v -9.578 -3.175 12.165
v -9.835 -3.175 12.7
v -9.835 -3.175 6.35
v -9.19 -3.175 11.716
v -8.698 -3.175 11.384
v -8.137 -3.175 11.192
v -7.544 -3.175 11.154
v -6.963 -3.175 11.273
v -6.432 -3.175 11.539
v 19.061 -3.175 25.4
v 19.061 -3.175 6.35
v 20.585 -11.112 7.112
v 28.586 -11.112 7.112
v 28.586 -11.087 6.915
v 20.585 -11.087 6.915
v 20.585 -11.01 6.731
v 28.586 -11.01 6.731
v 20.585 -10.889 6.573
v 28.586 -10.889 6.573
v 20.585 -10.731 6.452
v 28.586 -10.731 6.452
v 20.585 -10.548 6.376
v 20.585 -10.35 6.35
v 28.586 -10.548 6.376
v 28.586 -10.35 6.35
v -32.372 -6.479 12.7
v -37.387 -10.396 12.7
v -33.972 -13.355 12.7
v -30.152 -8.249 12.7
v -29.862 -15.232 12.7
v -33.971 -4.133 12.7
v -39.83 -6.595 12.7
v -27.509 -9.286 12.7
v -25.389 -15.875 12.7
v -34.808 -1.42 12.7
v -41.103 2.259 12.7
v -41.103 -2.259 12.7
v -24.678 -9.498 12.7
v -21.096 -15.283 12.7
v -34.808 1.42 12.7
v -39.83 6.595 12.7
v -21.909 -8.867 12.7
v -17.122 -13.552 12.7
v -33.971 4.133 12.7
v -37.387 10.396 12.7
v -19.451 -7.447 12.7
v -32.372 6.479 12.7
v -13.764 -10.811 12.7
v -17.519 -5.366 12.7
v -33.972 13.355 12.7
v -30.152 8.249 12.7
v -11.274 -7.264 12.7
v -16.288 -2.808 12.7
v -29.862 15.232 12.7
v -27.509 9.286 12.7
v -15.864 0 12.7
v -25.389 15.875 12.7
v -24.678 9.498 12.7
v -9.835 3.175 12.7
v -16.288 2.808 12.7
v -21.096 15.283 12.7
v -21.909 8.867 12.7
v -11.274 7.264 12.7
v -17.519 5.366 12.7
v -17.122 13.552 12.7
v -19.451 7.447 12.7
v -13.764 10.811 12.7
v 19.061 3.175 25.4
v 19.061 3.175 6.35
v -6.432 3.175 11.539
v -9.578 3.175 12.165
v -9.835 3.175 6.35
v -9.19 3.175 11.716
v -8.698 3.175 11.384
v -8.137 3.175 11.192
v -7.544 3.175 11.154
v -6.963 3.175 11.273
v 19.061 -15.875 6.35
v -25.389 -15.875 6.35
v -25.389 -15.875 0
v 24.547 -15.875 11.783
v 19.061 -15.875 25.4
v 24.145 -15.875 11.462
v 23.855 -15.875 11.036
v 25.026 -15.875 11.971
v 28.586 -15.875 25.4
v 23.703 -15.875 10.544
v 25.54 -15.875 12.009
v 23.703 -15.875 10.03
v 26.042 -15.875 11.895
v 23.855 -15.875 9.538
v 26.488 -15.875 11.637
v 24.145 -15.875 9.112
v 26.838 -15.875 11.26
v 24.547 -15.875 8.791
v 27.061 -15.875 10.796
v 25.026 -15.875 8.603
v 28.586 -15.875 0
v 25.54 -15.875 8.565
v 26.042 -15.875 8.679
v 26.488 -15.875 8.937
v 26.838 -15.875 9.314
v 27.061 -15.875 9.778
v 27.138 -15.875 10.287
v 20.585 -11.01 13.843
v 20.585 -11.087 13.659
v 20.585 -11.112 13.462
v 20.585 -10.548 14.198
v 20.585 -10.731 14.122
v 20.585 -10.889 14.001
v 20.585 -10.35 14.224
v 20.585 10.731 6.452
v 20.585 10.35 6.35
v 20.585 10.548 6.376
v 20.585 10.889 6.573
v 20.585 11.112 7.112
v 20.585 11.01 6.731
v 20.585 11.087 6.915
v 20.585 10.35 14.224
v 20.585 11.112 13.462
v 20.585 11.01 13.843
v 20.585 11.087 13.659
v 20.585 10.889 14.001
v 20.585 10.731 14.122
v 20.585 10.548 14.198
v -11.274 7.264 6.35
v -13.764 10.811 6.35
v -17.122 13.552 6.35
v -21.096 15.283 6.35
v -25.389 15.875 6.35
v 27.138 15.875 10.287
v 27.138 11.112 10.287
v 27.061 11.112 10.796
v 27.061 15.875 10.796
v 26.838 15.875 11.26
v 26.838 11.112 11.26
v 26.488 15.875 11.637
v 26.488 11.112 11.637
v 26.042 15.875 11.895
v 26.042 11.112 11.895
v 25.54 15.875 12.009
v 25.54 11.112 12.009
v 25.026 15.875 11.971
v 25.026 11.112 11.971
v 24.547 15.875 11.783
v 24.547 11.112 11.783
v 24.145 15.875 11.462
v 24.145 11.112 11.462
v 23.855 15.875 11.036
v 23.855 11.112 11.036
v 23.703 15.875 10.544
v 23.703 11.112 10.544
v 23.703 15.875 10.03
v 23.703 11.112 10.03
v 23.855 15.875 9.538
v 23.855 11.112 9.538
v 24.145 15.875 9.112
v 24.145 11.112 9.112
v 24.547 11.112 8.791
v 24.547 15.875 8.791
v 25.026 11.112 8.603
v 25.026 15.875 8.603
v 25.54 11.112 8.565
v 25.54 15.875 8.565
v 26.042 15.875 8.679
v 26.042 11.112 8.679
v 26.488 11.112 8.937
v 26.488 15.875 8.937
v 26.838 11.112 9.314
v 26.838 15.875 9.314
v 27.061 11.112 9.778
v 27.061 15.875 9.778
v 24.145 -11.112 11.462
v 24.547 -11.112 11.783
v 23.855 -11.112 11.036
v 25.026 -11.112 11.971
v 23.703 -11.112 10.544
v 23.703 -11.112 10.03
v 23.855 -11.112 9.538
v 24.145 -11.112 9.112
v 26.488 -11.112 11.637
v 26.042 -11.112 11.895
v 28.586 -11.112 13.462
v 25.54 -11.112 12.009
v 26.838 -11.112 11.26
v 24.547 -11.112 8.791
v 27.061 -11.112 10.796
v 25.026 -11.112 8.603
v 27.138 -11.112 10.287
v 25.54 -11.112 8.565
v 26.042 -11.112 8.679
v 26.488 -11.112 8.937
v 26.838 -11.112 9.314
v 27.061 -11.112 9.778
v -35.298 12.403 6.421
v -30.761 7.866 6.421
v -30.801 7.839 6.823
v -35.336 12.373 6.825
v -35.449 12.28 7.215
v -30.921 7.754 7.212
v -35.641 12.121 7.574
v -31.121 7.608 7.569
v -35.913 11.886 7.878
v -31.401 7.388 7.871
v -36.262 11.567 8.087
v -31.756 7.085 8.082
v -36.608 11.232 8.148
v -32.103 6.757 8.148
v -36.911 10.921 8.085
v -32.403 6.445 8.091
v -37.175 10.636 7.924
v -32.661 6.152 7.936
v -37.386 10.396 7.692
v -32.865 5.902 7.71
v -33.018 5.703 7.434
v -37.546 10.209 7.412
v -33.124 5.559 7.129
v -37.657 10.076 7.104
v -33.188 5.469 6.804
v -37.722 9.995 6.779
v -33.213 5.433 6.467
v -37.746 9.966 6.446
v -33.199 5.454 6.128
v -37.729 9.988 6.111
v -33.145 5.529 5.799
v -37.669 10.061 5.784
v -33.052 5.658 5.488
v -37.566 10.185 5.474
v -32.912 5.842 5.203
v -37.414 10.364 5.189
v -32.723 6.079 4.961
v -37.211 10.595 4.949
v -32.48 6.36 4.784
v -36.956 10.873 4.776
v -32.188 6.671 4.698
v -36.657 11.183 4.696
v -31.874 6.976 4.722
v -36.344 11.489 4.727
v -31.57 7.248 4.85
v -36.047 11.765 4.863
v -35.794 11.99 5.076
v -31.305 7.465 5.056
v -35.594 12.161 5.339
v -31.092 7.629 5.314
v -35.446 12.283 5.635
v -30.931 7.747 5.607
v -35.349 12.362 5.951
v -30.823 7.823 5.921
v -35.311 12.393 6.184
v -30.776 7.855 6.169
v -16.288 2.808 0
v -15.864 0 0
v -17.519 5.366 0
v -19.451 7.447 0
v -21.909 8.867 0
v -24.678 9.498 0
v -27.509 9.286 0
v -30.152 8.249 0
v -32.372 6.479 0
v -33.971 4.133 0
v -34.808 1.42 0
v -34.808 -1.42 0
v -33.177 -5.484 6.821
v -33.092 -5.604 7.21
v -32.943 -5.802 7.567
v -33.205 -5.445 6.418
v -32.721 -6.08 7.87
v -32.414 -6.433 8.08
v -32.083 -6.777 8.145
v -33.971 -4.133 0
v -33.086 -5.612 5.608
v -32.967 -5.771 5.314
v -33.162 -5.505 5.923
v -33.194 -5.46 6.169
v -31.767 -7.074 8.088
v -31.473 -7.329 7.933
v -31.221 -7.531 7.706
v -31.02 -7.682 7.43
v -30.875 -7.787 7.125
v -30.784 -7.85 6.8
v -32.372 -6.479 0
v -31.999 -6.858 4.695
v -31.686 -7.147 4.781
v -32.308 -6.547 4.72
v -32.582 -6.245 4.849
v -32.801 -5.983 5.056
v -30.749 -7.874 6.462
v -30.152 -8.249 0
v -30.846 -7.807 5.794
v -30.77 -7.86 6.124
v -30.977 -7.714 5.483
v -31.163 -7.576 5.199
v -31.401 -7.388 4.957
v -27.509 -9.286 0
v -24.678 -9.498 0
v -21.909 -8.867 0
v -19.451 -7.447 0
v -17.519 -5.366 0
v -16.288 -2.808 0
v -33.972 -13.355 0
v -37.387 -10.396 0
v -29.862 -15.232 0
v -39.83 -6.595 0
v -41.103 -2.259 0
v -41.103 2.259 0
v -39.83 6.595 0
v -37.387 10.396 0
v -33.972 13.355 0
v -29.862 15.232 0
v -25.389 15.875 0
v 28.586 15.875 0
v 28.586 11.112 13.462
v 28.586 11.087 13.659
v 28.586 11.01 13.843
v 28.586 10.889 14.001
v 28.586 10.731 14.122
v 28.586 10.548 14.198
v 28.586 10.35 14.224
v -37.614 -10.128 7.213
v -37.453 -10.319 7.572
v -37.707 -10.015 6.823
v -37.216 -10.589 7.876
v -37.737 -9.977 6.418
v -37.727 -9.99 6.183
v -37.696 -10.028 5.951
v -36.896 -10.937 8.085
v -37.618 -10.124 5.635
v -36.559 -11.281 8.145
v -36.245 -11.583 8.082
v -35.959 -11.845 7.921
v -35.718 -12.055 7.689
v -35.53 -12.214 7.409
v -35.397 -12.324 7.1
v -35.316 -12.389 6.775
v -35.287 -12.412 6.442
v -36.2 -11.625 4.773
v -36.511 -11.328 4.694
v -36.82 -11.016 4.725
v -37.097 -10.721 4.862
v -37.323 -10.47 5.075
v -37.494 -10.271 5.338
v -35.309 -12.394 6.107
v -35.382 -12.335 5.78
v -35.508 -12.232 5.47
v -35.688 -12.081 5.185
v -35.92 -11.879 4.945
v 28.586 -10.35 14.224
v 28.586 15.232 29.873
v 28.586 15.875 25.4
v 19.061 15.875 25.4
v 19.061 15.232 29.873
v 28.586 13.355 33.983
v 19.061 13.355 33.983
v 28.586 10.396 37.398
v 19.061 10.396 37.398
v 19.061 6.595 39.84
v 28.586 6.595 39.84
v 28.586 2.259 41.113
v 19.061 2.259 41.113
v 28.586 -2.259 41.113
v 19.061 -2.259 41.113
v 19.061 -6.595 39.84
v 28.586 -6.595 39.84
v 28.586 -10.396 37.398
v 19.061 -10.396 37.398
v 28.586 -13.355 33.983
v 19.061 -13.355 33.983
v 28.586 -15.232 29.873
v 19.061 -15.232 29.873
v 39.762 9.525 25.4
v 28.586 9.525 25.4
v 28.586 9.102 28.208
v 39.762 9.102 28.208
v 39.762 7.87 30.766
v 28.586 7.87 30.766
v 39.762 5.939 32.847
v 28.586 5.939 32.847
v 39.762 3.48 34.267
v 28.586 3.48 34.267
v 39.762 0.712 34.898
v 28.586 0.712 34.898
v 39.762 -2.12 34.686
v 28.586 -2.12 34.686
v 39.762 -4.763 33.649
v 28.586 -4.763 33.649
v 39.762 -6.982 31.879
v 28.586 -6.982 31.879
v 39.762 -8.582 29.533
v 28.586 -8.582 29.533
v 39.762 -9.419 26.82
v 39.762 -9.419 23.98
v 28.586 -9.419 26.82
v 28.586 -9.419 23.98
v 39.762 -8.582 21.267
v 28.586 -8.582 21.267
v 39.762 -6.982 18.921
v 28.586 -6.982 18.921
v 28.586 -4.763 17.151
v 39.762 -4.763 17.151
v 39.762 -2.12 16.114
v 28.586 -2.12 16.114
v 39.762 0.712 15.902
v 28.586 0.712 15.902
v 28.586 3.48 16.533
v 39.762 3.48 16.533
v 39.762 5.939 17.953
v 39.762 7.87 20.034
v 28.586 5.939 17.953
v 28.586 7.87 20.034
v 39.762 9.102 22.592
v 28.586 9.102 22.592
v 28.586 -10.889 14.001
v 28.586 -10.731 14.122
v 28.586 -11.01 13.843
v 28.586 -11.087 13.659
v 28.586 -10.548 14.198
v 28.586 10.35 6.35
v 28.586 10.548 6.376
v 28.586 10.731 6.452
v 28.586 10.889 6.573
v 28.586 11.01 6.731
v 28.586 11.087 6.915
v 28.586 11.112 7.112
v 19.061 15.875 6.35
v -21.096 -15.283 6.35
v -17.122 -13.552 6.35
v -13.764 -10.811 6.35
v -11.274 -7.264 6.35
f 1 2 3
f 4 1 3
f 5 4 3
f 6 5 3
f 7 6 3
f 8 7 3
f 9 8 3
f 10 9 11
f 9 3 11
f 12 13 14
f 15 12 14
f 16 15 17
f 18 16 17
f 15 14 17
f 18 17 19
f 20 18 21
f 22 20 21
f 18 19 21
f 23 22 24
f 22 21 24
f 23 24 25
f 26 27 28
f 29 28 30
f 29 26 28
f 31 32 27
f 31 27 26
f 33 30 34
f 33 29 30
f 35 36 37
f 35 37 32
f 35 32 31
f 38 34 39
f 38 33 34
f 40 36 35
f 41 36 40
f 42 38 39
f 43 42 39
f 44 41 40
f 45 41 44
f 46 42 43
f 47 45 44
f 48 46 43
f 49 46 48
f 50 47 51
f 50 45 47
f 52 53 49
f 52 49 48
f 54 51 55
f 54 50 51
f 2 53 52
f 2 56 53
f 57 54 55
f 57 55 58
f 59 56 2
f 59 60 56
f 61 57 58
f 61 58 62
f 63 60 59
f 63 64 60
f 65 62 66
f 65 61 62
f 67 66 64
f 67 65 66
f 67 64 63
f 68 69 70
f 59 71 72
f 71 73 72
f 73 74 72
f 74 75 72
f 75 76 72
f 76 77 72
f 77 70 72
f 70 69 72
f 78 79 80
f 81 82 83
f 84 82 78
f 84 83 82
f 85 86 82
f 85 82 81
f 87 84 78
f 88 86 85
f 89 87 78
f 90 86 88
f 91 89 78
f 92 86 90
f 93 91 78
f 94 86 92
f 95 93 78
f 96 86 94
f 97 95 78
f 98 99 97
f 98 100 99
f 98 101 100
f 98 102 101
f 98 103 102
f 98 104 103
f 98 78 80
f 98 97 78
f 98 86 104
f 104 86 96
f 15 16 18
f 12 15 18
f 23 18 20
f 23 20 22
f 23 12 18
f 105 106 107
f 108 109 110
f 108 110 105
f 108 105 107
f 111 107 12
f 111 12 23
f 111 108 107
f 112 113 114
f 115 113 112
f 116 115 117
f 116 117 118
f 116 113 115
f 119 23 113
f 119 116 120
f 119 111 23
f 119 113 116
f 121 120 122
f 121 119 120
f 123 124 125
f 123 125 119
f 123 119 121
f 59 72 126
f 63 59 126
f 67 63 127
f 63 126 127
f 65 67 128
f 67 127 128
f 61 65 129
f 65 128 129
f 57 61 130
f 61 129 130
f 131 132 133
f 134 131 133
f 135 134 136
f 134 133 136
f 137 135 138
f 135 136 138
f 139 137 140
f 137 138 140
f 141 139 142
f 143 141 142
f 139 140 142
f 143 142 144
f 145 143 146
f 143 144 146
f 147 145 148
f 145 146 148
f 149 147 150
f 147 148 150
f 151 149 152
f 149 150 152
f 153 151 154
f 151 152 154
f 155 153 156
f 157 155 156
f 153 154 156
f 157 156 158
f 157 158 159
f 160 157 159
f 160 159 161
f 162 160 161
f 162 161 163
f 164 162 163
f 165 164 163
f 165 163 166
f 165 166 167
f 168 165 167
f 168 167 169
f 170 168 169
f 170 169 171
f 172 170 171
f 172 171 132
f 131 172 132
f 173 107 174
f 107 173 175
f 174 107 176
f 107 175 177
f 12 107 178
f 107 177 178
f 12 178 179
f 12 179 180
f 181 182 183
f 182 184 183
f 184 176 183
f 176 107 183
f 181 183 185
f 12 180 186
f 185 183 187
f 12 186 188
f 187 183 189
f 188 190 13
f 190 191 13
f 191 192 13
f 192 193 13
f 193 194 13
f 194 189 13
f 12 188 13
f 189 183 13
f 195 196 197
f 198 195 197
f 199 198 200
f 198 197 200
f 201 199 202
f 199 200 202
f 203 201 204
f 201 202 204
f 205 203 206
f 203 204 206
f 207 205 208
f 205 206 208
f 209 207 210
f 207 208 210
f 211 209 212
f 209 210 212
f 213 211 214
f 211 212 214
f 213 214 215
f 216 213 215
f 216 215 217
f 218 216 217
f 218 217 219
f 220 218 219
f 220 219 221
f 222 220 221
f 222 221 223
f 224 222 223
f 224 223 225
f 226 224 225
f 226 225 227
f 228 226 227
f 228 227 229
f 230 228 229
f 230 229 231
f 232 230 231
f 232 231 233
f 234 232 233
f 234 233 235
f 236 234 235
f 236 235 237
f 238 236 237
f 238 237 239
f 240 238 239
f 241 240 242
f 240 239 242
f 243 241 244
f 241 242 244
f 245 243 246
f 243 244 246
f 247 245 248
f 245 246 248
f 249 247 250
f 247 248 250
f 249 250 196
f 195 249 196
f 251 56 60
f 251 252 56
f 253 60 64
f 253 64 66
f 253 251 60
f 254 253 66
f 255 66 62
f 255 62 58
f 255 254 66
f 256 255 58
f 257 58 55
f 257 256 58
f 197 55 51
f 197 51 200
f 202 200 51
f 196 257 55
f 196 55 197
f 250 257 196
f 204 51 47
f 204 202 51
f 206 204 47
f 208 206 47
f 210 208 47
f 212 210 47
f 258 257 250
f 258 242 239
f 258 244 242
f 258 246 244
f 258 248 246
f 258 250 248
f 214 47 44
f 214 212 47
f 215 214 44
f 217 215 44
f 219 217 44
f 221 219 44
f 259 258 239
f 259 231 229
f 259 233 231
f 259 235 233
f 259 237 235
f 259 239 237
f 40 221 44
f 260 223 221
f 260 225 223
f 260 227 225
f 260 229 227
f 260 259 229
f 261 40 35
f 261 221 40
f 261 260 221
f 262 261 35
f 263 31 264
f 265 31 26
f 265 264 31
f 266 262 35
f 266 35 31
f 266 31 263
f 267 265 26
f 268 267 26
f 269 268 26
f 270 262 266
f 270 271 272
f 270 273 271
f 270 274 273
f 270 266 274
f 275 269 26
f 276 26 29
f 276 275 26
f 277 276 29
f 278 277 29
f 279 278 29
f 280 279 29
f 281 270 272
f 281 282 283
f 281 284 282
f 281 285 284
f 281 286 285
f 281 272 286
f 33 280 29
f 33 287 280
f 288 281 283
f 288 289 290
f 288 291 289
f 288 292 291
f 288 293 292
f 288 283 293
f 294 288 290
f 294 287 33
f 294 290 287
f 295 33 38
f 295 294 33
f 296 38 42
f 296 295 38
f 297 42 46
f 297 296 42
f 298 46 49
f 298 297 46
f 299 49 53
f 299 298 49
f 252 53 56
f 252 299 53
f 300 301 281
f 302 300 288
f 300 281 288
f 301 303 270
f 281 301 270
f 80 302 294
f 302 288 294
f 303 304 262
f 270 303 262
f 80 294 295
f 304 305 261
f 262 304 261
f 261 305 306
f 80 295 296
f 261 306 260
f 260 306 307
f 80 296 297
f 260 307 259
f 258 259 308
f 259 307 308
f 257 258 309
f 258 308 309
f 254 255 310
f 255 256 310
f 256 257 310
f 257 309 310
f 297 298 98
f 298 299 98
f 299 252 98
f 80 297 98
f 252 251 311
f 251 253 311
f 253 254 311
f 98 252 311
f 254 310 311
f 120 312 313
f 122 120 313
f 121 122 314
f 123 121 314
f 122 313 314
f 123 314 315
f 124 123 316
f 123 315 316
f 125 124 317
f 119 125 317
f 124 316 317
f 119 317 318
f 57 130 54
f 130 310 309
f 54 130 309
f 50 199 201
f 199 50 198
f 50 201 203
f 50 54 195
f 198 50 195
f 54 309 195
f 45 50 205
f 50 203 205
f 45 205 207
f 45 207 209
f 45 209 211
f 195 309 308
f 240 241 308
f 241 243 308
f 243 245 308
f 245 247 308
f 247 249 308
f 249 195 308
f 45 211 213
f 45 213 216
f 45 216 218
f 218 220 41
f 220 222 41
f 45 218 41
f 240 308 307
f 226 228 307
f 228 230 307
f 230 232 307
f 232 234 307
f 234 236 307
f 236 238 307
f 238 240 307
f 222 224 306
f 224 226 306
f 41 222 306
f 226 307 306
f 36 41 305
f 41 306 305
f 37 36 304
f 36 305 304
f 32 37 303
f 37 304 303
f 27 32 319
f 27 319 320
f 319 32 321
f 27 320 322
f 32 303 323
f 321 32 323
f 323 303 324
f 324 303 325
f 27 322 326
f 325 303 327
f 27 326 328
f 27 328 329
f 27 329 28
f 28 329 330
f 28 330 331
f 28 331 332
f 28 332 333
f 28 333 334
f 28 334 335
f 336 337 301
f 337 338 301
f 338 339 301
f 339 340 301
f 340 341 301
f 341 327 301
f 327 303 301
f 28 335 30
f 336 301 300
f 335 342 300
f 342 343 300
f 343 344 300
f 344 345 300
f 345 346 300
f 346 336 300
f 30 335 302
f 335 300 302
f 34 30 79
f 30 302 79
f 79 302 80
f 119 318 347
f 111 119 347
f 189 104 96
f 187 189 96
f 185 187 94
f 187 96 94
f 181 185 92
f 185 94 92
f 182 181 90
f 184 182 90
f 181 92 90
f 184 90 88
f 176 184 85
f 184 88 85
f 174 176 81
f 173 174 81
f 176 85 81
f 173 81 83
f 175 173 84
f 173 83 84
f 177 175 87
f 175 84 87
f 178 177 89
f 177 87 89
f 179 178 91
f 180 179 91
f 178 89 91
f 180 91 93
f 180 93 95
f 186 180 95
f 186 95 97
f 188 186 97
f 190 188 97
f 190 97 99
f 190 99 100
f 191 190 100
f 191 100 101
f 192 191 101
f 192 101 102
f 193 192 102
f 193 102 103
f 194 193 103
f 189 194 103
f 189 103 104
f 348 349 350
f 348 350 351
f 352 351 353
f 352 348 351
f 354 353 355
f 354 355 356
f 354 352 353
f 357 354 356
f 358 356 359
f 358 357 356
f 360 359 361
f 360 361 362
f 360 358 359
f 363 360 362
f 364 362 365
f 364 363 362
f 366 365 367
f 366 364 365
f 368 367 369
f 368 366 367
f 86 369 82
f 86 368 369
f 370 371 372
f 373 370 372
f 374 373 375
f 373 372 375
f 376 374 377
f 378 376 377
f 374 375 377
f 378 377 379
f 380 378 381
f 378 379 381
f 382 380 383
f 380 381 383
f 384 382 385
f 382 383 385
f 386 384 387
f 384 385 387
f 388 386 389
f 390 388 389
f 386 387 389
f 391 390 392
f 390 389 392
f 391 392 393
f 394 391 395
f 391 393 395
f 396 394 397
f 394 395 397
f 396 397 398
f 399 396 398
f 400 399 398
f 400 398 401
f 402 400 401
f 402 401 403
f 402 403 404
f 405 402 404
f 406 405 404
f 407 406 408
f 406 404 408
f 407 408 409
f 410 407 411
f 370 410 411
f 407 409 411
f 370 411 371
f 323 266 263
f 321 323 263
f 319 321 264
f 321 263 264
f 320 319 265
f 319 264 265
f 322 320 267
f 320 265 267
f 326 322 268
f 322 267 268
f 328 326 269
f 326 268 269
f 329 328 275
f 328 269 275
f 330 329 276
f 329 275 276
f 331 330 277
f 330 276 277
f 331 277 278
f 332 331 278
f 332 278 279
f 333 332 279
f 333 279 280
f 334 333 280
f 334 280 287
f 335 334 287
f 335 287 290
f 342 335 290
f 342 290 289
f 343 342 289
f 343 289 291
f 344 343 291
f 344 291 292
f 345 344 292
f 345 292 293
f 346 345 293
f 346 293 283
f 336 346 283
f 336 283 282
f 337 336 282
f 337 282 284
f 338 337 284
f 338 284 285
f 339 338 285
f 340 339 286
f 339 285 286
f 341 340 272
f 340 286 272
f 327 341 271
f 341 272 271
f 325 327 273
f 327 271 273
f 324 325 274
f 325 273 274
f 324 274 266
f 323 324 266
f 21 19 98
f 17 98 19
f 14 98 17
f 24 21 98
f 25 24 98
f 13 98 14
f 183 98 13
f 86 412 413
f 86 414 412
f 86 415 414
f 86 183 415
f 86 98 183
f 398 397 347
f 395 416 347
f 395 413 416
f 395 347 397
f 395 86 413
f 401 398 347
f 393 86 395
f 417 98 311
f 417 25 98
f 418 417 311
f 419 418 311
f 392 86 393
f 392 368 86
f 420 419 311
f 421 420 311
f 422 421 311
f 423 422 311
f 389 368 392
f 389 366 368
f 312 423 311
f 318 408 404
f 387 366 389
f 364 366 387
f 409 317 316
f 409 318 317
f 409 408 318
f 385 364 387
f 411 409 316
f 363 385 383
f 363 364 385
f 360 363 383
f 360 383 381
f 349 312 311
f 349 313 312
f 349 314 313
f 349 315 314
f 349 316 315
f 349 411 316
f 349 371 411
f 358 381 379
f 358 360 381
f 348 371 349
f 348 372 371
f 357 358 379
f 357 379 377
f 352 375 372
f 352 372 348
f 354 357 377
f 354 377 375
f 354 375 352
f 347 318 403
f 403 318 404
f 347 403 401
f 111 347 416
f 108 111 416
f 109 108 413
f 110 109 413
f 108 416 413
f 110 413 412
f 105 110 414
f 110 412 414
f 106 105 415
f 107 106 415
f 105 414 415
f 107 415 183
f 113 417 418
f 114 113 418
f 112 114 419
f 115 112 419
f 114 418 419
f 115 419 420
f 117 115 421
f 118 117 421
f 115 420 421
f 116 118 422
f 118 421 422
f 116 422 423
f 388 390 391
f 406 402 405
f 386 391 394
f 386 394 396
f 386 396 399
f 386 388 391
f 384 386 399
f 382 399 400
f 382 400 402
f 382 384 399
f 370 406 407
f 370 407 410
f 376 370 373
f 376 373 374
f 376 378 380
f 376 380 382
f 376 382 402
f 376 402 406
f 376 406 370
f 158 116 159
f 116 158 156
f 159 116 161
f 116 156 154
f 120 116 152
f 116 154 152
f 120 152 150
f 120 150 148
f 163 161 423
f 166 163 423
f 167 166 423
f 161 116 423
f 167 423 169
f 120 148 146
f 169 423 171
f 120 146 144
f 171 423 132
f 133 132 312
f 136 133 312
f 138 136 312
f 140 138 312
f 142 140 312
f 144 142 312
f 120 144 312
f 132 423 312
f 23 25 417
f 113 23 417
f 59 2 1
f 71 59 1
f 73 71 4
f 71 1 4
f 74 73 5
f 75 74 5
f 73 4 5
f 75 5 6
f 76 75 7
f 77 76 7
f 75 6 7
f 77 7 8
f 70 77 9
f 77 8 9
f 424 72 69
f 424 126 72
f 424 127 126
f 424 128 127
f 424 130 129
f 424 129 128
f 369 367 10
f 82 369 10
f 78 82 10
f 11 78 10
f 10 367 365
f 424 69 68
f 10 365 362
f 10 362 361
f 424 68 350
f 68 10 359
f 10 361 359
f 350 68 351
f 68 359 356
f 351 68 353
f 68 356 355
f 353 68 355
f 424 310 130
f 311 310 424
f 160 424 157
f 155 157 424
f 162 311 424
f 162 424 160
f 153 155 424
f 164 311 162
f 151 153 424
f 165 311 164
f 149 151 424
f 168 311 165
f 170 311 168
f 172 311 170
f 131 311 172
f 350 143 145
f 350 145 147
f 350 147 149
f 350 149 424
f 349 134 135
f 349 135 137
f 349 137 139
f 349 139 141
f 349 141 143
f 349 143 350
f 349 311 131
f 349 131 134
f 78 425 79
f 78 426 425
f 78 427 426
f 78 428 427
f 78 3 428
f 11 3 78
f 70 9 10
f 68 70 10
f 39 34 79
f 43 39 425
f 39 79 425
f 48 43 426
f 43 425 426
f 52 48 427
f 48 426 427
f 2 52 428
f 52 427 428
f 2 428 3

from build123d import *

# Parameters (mm, degrees)
F0_R      = 9.525
F1_DEPTH  = 6.35
F2_R      = 9.525
F3_DEPTH  = 6.35
F5_DEPTH  = 9.525
F6_R      = 9.525
F7_DEPTH  = 11.176
F9_DEPTH  = 8.001
F10_R     = 1.7272
F11_DEPTH = 31.75
F13_DEPTH = 3.175
F14_DEPTH = 3.175
F19_R     = 1.7272
F20_DEPTH = 25.4
F21_R     = 1.7272
F22_DEPTH = 25.4
F26_DEPTH = 25.4
F28_DEPTH = 25.4


with BuildPart() as f1:
    # F0 (on Top) → F1 (new body)
    with BuildSketch(Plane.XY):
        with BuildLine():
            ThreePointArc((-9.514346, 0), (-14.164026, -11.22532), (-25.389346, -15.875))
            Line((-25.389346, -15.875), (28.585654, -15.875))
            Line((28.585654, -15.875), (28.585654, 15.875))
            Line((28.585654, 15.875), (-25.389346, 15.875))
            ThreePointArc((-25.389346, 15.875), (-14.164026, 11.22532), (-9.514346, 0))
        make_face()
        with BuildLine():
            ThreePointArc((-25.389346, 15.875), (-41.264346, 0), (-25.389346, -15.875))
            ThreePointArc((-25.389346, -15.875), (-14.164026, -11.22532), (-9.514346, 0))
            ThreePointArc((-9.514346, 0), (-14.164026, 11.22532), (-25.389346, 15.875))
        make_face()
        with Locations((-25.389346, 0)):
            Circle(F0_R, mode=Mode.SUBTRACT)
    extrude(amount=F1_DEPTH)

    # F2 (on face) → F3 (join)
    with BuildSketch(Plane.XY.offset(6.35)):
        with BuildLine():
            ThreePointArc((-25.389346, -15.875), (-14.164026, -11.22532), (-9.514346, 0))
            ThreePointArc((-9.514346, 0), (-14.164026, 11.22532), (-25.389346, 15.875))
            ThreePointArc((-25.389346, 15.875), (-41.264346, 0), (-25.389346, -15.875))
        make_face()
        with Locations((-25.389346, 0)):
            Circle(F2_R, mode=Mode.SUBTRACT)
    extrude(amount=F3_DEPTH)

    # F4 (on face) → F5 (join)
    with BuildSketch(Plane.YZ.offset(28.585654)):
        with BuildLine():
            Line((-15.875, 25.4), (-15.875, 0))
            Line((-15.875, 0), (15.875, 0))
            Line((15.875, 0), (15.875, 25.4))
            ThreePointArc((15.875, 25.4), (0, 41.275), (-15.875, 25.4))
        make_face()
    extrude(amount=-F5_DEPTH)

    # F6 (on face) → F7 (join)
    with BuildSketch(Plane.YZ.offset(28.585654)):
        with Locations((0, 25.4)):
            Circle(F6_R)
    extrude(amount=F7_DEPTH)

    # F8 (on face) → F9 (cut)
    with BuildSketch(Plane.YZ.offset(28.585654)):
        with BuildLine():
            Line((-10.3505, 6.35), (10.3505, 6.35))
            ThreePointArc((10.3505, 6.35), (10.889315, 6.573185), (11.1125, 7.112))
            Line((11.1125, 7.112), (11.1125, 13.462))
            ThreePointArc((11.1125, 13.462), (10.889315, 14.000815), (10.3505, 14.224))
            Line((10.3505, 14.224), (-10.3505, 14.224))
            ThreePointArc((-10.3505, 14.224), (-10.889315, 14.000815), (-11.1125, 13.462))
            Line((-11.1125, 13.462), (-11.1125, 7.112))
            ThreePointArc((-11.1125, 7.112), (-10.889315, 6.573185), (-10.3505, 6.35))
        make_face()
    extrude(amount=-F9_DEPTH, mode=Mode.SUBTRACT)

    # F10 (on face) → F11 (cut)
    with BuildSketch(Plane.XZ.offset(15.875)):
        with Locations((25.410654, 10.287)):
            Circle(F10_R)
    extrude(amount=-F11_DEPTH, mode=Mode.SUBTRACT)

    # F19 (on face) → F20 (cut)
    with BuildSketch(Plane(origin=(-12.694673, 12.694673, 0), x_dir=(0.707107, 0.707107, 0), z_dir=(0.707107, -0.707107, 0))):
        with Locations((-17.916348, 6.420591)):
            Circle(F19_R)
    extrude(amount=-F20_DEPTH, mode=Mode.SUBTRACT)

    # F21 (on face) → F22 (cut)
    with BuildSketch(Plane(origin=(-12.694673, -12.694673, 0), x_dir=(-0.707107, 0.707107, 0), z_dir=(0.707107, 0.707107, 0))):
        with Locations((17.901907, 6.418147)):
            Circle(F21_R)
    extrude(amount=-F22_DEPTH, mode=Mode.SUBTRACT)

    # F25 (on face) → F26 (join)
    with BuildSketch(Plane.XY.offset(6.35)):
        with BuildLine():
            ThreePointArc((-9.835086, 3.175), (-9.514346, 0), (-9.835086, -3.175))
            Line((-9.835086, -3.175), (19.060654, -3.175))
            Line((19.060654, -3.175), (19.060654, 3.175))
            Line((19.060654, 3.175), (-9.835086, 3.175))
        make_face()
    extrude(amount=F26_DEPTH)

    # F27 (on face) → F28 (cut)
    with BuildSketch(Plane.XZ.offset(3.175)):
        with BuildLine():
            Line((-6.43225, 11.53927), (19.060654, 25.4))
            Line((19.060654, 25.4), (19.060654, 31.75))
            Line((19.060654, 31.75), (-9.835086, 31.75))
            Line((-9.835086, 31.75), (-9.835086, 12.7))
            ThreePointArc((-9.835086, 12.7), (-8.423755, 11.269205), (-6.43225, 11.53927))
        make_face()
    extrude(amount=-F28_DEPTH, mode=Mode.SUBTRACT)


with BuildPart() as f13:
    # F12 (on Front) → F13 (new body, symmetric)
    with BuildSketch(Plane.XZ):
        with BuildLine():
            Line((18.935824, 6.271193), (19.060654, 25.4))
            Line((19.060654, 25.4), (-5.57432, 8.746564))
            ThreePointArc((-5.57432, 8.746564), (-8.13987, 8.590052), (-9.515413, 10.761324))
            Line((-9.515413, 10.761324), (-9.515413, 6.271193))
            Line((-9.515413, 6.271193), (18.935824, 6.271193))
        make_face()
    extrude(amount=F13_DEPTH, both=True)


with BuildPart() as f14:
    # F12 (on Front) → F14 (new body, symmetric)
    with BuildSketch(Plane.XZ):
        with BuildLine():
            Line((18.935824, 6.271193), (19.060654, 25.4))
            Line((19.060654, 25.4), (-5.57432, 8.746564))
            ThreePointArc((-5.57432, 8.746564), (-8.13987, 8.590052), (-9.515413, 10.761324))
            Line((-9.515413, 10.761324), (-9.515413, 6.271193))
            Line((-9.515413, 6.271193), (18.935824, 6.271193))
        make_face()
    extrude(amount=F14_DEPTH, both=True)


solid = f1.part
